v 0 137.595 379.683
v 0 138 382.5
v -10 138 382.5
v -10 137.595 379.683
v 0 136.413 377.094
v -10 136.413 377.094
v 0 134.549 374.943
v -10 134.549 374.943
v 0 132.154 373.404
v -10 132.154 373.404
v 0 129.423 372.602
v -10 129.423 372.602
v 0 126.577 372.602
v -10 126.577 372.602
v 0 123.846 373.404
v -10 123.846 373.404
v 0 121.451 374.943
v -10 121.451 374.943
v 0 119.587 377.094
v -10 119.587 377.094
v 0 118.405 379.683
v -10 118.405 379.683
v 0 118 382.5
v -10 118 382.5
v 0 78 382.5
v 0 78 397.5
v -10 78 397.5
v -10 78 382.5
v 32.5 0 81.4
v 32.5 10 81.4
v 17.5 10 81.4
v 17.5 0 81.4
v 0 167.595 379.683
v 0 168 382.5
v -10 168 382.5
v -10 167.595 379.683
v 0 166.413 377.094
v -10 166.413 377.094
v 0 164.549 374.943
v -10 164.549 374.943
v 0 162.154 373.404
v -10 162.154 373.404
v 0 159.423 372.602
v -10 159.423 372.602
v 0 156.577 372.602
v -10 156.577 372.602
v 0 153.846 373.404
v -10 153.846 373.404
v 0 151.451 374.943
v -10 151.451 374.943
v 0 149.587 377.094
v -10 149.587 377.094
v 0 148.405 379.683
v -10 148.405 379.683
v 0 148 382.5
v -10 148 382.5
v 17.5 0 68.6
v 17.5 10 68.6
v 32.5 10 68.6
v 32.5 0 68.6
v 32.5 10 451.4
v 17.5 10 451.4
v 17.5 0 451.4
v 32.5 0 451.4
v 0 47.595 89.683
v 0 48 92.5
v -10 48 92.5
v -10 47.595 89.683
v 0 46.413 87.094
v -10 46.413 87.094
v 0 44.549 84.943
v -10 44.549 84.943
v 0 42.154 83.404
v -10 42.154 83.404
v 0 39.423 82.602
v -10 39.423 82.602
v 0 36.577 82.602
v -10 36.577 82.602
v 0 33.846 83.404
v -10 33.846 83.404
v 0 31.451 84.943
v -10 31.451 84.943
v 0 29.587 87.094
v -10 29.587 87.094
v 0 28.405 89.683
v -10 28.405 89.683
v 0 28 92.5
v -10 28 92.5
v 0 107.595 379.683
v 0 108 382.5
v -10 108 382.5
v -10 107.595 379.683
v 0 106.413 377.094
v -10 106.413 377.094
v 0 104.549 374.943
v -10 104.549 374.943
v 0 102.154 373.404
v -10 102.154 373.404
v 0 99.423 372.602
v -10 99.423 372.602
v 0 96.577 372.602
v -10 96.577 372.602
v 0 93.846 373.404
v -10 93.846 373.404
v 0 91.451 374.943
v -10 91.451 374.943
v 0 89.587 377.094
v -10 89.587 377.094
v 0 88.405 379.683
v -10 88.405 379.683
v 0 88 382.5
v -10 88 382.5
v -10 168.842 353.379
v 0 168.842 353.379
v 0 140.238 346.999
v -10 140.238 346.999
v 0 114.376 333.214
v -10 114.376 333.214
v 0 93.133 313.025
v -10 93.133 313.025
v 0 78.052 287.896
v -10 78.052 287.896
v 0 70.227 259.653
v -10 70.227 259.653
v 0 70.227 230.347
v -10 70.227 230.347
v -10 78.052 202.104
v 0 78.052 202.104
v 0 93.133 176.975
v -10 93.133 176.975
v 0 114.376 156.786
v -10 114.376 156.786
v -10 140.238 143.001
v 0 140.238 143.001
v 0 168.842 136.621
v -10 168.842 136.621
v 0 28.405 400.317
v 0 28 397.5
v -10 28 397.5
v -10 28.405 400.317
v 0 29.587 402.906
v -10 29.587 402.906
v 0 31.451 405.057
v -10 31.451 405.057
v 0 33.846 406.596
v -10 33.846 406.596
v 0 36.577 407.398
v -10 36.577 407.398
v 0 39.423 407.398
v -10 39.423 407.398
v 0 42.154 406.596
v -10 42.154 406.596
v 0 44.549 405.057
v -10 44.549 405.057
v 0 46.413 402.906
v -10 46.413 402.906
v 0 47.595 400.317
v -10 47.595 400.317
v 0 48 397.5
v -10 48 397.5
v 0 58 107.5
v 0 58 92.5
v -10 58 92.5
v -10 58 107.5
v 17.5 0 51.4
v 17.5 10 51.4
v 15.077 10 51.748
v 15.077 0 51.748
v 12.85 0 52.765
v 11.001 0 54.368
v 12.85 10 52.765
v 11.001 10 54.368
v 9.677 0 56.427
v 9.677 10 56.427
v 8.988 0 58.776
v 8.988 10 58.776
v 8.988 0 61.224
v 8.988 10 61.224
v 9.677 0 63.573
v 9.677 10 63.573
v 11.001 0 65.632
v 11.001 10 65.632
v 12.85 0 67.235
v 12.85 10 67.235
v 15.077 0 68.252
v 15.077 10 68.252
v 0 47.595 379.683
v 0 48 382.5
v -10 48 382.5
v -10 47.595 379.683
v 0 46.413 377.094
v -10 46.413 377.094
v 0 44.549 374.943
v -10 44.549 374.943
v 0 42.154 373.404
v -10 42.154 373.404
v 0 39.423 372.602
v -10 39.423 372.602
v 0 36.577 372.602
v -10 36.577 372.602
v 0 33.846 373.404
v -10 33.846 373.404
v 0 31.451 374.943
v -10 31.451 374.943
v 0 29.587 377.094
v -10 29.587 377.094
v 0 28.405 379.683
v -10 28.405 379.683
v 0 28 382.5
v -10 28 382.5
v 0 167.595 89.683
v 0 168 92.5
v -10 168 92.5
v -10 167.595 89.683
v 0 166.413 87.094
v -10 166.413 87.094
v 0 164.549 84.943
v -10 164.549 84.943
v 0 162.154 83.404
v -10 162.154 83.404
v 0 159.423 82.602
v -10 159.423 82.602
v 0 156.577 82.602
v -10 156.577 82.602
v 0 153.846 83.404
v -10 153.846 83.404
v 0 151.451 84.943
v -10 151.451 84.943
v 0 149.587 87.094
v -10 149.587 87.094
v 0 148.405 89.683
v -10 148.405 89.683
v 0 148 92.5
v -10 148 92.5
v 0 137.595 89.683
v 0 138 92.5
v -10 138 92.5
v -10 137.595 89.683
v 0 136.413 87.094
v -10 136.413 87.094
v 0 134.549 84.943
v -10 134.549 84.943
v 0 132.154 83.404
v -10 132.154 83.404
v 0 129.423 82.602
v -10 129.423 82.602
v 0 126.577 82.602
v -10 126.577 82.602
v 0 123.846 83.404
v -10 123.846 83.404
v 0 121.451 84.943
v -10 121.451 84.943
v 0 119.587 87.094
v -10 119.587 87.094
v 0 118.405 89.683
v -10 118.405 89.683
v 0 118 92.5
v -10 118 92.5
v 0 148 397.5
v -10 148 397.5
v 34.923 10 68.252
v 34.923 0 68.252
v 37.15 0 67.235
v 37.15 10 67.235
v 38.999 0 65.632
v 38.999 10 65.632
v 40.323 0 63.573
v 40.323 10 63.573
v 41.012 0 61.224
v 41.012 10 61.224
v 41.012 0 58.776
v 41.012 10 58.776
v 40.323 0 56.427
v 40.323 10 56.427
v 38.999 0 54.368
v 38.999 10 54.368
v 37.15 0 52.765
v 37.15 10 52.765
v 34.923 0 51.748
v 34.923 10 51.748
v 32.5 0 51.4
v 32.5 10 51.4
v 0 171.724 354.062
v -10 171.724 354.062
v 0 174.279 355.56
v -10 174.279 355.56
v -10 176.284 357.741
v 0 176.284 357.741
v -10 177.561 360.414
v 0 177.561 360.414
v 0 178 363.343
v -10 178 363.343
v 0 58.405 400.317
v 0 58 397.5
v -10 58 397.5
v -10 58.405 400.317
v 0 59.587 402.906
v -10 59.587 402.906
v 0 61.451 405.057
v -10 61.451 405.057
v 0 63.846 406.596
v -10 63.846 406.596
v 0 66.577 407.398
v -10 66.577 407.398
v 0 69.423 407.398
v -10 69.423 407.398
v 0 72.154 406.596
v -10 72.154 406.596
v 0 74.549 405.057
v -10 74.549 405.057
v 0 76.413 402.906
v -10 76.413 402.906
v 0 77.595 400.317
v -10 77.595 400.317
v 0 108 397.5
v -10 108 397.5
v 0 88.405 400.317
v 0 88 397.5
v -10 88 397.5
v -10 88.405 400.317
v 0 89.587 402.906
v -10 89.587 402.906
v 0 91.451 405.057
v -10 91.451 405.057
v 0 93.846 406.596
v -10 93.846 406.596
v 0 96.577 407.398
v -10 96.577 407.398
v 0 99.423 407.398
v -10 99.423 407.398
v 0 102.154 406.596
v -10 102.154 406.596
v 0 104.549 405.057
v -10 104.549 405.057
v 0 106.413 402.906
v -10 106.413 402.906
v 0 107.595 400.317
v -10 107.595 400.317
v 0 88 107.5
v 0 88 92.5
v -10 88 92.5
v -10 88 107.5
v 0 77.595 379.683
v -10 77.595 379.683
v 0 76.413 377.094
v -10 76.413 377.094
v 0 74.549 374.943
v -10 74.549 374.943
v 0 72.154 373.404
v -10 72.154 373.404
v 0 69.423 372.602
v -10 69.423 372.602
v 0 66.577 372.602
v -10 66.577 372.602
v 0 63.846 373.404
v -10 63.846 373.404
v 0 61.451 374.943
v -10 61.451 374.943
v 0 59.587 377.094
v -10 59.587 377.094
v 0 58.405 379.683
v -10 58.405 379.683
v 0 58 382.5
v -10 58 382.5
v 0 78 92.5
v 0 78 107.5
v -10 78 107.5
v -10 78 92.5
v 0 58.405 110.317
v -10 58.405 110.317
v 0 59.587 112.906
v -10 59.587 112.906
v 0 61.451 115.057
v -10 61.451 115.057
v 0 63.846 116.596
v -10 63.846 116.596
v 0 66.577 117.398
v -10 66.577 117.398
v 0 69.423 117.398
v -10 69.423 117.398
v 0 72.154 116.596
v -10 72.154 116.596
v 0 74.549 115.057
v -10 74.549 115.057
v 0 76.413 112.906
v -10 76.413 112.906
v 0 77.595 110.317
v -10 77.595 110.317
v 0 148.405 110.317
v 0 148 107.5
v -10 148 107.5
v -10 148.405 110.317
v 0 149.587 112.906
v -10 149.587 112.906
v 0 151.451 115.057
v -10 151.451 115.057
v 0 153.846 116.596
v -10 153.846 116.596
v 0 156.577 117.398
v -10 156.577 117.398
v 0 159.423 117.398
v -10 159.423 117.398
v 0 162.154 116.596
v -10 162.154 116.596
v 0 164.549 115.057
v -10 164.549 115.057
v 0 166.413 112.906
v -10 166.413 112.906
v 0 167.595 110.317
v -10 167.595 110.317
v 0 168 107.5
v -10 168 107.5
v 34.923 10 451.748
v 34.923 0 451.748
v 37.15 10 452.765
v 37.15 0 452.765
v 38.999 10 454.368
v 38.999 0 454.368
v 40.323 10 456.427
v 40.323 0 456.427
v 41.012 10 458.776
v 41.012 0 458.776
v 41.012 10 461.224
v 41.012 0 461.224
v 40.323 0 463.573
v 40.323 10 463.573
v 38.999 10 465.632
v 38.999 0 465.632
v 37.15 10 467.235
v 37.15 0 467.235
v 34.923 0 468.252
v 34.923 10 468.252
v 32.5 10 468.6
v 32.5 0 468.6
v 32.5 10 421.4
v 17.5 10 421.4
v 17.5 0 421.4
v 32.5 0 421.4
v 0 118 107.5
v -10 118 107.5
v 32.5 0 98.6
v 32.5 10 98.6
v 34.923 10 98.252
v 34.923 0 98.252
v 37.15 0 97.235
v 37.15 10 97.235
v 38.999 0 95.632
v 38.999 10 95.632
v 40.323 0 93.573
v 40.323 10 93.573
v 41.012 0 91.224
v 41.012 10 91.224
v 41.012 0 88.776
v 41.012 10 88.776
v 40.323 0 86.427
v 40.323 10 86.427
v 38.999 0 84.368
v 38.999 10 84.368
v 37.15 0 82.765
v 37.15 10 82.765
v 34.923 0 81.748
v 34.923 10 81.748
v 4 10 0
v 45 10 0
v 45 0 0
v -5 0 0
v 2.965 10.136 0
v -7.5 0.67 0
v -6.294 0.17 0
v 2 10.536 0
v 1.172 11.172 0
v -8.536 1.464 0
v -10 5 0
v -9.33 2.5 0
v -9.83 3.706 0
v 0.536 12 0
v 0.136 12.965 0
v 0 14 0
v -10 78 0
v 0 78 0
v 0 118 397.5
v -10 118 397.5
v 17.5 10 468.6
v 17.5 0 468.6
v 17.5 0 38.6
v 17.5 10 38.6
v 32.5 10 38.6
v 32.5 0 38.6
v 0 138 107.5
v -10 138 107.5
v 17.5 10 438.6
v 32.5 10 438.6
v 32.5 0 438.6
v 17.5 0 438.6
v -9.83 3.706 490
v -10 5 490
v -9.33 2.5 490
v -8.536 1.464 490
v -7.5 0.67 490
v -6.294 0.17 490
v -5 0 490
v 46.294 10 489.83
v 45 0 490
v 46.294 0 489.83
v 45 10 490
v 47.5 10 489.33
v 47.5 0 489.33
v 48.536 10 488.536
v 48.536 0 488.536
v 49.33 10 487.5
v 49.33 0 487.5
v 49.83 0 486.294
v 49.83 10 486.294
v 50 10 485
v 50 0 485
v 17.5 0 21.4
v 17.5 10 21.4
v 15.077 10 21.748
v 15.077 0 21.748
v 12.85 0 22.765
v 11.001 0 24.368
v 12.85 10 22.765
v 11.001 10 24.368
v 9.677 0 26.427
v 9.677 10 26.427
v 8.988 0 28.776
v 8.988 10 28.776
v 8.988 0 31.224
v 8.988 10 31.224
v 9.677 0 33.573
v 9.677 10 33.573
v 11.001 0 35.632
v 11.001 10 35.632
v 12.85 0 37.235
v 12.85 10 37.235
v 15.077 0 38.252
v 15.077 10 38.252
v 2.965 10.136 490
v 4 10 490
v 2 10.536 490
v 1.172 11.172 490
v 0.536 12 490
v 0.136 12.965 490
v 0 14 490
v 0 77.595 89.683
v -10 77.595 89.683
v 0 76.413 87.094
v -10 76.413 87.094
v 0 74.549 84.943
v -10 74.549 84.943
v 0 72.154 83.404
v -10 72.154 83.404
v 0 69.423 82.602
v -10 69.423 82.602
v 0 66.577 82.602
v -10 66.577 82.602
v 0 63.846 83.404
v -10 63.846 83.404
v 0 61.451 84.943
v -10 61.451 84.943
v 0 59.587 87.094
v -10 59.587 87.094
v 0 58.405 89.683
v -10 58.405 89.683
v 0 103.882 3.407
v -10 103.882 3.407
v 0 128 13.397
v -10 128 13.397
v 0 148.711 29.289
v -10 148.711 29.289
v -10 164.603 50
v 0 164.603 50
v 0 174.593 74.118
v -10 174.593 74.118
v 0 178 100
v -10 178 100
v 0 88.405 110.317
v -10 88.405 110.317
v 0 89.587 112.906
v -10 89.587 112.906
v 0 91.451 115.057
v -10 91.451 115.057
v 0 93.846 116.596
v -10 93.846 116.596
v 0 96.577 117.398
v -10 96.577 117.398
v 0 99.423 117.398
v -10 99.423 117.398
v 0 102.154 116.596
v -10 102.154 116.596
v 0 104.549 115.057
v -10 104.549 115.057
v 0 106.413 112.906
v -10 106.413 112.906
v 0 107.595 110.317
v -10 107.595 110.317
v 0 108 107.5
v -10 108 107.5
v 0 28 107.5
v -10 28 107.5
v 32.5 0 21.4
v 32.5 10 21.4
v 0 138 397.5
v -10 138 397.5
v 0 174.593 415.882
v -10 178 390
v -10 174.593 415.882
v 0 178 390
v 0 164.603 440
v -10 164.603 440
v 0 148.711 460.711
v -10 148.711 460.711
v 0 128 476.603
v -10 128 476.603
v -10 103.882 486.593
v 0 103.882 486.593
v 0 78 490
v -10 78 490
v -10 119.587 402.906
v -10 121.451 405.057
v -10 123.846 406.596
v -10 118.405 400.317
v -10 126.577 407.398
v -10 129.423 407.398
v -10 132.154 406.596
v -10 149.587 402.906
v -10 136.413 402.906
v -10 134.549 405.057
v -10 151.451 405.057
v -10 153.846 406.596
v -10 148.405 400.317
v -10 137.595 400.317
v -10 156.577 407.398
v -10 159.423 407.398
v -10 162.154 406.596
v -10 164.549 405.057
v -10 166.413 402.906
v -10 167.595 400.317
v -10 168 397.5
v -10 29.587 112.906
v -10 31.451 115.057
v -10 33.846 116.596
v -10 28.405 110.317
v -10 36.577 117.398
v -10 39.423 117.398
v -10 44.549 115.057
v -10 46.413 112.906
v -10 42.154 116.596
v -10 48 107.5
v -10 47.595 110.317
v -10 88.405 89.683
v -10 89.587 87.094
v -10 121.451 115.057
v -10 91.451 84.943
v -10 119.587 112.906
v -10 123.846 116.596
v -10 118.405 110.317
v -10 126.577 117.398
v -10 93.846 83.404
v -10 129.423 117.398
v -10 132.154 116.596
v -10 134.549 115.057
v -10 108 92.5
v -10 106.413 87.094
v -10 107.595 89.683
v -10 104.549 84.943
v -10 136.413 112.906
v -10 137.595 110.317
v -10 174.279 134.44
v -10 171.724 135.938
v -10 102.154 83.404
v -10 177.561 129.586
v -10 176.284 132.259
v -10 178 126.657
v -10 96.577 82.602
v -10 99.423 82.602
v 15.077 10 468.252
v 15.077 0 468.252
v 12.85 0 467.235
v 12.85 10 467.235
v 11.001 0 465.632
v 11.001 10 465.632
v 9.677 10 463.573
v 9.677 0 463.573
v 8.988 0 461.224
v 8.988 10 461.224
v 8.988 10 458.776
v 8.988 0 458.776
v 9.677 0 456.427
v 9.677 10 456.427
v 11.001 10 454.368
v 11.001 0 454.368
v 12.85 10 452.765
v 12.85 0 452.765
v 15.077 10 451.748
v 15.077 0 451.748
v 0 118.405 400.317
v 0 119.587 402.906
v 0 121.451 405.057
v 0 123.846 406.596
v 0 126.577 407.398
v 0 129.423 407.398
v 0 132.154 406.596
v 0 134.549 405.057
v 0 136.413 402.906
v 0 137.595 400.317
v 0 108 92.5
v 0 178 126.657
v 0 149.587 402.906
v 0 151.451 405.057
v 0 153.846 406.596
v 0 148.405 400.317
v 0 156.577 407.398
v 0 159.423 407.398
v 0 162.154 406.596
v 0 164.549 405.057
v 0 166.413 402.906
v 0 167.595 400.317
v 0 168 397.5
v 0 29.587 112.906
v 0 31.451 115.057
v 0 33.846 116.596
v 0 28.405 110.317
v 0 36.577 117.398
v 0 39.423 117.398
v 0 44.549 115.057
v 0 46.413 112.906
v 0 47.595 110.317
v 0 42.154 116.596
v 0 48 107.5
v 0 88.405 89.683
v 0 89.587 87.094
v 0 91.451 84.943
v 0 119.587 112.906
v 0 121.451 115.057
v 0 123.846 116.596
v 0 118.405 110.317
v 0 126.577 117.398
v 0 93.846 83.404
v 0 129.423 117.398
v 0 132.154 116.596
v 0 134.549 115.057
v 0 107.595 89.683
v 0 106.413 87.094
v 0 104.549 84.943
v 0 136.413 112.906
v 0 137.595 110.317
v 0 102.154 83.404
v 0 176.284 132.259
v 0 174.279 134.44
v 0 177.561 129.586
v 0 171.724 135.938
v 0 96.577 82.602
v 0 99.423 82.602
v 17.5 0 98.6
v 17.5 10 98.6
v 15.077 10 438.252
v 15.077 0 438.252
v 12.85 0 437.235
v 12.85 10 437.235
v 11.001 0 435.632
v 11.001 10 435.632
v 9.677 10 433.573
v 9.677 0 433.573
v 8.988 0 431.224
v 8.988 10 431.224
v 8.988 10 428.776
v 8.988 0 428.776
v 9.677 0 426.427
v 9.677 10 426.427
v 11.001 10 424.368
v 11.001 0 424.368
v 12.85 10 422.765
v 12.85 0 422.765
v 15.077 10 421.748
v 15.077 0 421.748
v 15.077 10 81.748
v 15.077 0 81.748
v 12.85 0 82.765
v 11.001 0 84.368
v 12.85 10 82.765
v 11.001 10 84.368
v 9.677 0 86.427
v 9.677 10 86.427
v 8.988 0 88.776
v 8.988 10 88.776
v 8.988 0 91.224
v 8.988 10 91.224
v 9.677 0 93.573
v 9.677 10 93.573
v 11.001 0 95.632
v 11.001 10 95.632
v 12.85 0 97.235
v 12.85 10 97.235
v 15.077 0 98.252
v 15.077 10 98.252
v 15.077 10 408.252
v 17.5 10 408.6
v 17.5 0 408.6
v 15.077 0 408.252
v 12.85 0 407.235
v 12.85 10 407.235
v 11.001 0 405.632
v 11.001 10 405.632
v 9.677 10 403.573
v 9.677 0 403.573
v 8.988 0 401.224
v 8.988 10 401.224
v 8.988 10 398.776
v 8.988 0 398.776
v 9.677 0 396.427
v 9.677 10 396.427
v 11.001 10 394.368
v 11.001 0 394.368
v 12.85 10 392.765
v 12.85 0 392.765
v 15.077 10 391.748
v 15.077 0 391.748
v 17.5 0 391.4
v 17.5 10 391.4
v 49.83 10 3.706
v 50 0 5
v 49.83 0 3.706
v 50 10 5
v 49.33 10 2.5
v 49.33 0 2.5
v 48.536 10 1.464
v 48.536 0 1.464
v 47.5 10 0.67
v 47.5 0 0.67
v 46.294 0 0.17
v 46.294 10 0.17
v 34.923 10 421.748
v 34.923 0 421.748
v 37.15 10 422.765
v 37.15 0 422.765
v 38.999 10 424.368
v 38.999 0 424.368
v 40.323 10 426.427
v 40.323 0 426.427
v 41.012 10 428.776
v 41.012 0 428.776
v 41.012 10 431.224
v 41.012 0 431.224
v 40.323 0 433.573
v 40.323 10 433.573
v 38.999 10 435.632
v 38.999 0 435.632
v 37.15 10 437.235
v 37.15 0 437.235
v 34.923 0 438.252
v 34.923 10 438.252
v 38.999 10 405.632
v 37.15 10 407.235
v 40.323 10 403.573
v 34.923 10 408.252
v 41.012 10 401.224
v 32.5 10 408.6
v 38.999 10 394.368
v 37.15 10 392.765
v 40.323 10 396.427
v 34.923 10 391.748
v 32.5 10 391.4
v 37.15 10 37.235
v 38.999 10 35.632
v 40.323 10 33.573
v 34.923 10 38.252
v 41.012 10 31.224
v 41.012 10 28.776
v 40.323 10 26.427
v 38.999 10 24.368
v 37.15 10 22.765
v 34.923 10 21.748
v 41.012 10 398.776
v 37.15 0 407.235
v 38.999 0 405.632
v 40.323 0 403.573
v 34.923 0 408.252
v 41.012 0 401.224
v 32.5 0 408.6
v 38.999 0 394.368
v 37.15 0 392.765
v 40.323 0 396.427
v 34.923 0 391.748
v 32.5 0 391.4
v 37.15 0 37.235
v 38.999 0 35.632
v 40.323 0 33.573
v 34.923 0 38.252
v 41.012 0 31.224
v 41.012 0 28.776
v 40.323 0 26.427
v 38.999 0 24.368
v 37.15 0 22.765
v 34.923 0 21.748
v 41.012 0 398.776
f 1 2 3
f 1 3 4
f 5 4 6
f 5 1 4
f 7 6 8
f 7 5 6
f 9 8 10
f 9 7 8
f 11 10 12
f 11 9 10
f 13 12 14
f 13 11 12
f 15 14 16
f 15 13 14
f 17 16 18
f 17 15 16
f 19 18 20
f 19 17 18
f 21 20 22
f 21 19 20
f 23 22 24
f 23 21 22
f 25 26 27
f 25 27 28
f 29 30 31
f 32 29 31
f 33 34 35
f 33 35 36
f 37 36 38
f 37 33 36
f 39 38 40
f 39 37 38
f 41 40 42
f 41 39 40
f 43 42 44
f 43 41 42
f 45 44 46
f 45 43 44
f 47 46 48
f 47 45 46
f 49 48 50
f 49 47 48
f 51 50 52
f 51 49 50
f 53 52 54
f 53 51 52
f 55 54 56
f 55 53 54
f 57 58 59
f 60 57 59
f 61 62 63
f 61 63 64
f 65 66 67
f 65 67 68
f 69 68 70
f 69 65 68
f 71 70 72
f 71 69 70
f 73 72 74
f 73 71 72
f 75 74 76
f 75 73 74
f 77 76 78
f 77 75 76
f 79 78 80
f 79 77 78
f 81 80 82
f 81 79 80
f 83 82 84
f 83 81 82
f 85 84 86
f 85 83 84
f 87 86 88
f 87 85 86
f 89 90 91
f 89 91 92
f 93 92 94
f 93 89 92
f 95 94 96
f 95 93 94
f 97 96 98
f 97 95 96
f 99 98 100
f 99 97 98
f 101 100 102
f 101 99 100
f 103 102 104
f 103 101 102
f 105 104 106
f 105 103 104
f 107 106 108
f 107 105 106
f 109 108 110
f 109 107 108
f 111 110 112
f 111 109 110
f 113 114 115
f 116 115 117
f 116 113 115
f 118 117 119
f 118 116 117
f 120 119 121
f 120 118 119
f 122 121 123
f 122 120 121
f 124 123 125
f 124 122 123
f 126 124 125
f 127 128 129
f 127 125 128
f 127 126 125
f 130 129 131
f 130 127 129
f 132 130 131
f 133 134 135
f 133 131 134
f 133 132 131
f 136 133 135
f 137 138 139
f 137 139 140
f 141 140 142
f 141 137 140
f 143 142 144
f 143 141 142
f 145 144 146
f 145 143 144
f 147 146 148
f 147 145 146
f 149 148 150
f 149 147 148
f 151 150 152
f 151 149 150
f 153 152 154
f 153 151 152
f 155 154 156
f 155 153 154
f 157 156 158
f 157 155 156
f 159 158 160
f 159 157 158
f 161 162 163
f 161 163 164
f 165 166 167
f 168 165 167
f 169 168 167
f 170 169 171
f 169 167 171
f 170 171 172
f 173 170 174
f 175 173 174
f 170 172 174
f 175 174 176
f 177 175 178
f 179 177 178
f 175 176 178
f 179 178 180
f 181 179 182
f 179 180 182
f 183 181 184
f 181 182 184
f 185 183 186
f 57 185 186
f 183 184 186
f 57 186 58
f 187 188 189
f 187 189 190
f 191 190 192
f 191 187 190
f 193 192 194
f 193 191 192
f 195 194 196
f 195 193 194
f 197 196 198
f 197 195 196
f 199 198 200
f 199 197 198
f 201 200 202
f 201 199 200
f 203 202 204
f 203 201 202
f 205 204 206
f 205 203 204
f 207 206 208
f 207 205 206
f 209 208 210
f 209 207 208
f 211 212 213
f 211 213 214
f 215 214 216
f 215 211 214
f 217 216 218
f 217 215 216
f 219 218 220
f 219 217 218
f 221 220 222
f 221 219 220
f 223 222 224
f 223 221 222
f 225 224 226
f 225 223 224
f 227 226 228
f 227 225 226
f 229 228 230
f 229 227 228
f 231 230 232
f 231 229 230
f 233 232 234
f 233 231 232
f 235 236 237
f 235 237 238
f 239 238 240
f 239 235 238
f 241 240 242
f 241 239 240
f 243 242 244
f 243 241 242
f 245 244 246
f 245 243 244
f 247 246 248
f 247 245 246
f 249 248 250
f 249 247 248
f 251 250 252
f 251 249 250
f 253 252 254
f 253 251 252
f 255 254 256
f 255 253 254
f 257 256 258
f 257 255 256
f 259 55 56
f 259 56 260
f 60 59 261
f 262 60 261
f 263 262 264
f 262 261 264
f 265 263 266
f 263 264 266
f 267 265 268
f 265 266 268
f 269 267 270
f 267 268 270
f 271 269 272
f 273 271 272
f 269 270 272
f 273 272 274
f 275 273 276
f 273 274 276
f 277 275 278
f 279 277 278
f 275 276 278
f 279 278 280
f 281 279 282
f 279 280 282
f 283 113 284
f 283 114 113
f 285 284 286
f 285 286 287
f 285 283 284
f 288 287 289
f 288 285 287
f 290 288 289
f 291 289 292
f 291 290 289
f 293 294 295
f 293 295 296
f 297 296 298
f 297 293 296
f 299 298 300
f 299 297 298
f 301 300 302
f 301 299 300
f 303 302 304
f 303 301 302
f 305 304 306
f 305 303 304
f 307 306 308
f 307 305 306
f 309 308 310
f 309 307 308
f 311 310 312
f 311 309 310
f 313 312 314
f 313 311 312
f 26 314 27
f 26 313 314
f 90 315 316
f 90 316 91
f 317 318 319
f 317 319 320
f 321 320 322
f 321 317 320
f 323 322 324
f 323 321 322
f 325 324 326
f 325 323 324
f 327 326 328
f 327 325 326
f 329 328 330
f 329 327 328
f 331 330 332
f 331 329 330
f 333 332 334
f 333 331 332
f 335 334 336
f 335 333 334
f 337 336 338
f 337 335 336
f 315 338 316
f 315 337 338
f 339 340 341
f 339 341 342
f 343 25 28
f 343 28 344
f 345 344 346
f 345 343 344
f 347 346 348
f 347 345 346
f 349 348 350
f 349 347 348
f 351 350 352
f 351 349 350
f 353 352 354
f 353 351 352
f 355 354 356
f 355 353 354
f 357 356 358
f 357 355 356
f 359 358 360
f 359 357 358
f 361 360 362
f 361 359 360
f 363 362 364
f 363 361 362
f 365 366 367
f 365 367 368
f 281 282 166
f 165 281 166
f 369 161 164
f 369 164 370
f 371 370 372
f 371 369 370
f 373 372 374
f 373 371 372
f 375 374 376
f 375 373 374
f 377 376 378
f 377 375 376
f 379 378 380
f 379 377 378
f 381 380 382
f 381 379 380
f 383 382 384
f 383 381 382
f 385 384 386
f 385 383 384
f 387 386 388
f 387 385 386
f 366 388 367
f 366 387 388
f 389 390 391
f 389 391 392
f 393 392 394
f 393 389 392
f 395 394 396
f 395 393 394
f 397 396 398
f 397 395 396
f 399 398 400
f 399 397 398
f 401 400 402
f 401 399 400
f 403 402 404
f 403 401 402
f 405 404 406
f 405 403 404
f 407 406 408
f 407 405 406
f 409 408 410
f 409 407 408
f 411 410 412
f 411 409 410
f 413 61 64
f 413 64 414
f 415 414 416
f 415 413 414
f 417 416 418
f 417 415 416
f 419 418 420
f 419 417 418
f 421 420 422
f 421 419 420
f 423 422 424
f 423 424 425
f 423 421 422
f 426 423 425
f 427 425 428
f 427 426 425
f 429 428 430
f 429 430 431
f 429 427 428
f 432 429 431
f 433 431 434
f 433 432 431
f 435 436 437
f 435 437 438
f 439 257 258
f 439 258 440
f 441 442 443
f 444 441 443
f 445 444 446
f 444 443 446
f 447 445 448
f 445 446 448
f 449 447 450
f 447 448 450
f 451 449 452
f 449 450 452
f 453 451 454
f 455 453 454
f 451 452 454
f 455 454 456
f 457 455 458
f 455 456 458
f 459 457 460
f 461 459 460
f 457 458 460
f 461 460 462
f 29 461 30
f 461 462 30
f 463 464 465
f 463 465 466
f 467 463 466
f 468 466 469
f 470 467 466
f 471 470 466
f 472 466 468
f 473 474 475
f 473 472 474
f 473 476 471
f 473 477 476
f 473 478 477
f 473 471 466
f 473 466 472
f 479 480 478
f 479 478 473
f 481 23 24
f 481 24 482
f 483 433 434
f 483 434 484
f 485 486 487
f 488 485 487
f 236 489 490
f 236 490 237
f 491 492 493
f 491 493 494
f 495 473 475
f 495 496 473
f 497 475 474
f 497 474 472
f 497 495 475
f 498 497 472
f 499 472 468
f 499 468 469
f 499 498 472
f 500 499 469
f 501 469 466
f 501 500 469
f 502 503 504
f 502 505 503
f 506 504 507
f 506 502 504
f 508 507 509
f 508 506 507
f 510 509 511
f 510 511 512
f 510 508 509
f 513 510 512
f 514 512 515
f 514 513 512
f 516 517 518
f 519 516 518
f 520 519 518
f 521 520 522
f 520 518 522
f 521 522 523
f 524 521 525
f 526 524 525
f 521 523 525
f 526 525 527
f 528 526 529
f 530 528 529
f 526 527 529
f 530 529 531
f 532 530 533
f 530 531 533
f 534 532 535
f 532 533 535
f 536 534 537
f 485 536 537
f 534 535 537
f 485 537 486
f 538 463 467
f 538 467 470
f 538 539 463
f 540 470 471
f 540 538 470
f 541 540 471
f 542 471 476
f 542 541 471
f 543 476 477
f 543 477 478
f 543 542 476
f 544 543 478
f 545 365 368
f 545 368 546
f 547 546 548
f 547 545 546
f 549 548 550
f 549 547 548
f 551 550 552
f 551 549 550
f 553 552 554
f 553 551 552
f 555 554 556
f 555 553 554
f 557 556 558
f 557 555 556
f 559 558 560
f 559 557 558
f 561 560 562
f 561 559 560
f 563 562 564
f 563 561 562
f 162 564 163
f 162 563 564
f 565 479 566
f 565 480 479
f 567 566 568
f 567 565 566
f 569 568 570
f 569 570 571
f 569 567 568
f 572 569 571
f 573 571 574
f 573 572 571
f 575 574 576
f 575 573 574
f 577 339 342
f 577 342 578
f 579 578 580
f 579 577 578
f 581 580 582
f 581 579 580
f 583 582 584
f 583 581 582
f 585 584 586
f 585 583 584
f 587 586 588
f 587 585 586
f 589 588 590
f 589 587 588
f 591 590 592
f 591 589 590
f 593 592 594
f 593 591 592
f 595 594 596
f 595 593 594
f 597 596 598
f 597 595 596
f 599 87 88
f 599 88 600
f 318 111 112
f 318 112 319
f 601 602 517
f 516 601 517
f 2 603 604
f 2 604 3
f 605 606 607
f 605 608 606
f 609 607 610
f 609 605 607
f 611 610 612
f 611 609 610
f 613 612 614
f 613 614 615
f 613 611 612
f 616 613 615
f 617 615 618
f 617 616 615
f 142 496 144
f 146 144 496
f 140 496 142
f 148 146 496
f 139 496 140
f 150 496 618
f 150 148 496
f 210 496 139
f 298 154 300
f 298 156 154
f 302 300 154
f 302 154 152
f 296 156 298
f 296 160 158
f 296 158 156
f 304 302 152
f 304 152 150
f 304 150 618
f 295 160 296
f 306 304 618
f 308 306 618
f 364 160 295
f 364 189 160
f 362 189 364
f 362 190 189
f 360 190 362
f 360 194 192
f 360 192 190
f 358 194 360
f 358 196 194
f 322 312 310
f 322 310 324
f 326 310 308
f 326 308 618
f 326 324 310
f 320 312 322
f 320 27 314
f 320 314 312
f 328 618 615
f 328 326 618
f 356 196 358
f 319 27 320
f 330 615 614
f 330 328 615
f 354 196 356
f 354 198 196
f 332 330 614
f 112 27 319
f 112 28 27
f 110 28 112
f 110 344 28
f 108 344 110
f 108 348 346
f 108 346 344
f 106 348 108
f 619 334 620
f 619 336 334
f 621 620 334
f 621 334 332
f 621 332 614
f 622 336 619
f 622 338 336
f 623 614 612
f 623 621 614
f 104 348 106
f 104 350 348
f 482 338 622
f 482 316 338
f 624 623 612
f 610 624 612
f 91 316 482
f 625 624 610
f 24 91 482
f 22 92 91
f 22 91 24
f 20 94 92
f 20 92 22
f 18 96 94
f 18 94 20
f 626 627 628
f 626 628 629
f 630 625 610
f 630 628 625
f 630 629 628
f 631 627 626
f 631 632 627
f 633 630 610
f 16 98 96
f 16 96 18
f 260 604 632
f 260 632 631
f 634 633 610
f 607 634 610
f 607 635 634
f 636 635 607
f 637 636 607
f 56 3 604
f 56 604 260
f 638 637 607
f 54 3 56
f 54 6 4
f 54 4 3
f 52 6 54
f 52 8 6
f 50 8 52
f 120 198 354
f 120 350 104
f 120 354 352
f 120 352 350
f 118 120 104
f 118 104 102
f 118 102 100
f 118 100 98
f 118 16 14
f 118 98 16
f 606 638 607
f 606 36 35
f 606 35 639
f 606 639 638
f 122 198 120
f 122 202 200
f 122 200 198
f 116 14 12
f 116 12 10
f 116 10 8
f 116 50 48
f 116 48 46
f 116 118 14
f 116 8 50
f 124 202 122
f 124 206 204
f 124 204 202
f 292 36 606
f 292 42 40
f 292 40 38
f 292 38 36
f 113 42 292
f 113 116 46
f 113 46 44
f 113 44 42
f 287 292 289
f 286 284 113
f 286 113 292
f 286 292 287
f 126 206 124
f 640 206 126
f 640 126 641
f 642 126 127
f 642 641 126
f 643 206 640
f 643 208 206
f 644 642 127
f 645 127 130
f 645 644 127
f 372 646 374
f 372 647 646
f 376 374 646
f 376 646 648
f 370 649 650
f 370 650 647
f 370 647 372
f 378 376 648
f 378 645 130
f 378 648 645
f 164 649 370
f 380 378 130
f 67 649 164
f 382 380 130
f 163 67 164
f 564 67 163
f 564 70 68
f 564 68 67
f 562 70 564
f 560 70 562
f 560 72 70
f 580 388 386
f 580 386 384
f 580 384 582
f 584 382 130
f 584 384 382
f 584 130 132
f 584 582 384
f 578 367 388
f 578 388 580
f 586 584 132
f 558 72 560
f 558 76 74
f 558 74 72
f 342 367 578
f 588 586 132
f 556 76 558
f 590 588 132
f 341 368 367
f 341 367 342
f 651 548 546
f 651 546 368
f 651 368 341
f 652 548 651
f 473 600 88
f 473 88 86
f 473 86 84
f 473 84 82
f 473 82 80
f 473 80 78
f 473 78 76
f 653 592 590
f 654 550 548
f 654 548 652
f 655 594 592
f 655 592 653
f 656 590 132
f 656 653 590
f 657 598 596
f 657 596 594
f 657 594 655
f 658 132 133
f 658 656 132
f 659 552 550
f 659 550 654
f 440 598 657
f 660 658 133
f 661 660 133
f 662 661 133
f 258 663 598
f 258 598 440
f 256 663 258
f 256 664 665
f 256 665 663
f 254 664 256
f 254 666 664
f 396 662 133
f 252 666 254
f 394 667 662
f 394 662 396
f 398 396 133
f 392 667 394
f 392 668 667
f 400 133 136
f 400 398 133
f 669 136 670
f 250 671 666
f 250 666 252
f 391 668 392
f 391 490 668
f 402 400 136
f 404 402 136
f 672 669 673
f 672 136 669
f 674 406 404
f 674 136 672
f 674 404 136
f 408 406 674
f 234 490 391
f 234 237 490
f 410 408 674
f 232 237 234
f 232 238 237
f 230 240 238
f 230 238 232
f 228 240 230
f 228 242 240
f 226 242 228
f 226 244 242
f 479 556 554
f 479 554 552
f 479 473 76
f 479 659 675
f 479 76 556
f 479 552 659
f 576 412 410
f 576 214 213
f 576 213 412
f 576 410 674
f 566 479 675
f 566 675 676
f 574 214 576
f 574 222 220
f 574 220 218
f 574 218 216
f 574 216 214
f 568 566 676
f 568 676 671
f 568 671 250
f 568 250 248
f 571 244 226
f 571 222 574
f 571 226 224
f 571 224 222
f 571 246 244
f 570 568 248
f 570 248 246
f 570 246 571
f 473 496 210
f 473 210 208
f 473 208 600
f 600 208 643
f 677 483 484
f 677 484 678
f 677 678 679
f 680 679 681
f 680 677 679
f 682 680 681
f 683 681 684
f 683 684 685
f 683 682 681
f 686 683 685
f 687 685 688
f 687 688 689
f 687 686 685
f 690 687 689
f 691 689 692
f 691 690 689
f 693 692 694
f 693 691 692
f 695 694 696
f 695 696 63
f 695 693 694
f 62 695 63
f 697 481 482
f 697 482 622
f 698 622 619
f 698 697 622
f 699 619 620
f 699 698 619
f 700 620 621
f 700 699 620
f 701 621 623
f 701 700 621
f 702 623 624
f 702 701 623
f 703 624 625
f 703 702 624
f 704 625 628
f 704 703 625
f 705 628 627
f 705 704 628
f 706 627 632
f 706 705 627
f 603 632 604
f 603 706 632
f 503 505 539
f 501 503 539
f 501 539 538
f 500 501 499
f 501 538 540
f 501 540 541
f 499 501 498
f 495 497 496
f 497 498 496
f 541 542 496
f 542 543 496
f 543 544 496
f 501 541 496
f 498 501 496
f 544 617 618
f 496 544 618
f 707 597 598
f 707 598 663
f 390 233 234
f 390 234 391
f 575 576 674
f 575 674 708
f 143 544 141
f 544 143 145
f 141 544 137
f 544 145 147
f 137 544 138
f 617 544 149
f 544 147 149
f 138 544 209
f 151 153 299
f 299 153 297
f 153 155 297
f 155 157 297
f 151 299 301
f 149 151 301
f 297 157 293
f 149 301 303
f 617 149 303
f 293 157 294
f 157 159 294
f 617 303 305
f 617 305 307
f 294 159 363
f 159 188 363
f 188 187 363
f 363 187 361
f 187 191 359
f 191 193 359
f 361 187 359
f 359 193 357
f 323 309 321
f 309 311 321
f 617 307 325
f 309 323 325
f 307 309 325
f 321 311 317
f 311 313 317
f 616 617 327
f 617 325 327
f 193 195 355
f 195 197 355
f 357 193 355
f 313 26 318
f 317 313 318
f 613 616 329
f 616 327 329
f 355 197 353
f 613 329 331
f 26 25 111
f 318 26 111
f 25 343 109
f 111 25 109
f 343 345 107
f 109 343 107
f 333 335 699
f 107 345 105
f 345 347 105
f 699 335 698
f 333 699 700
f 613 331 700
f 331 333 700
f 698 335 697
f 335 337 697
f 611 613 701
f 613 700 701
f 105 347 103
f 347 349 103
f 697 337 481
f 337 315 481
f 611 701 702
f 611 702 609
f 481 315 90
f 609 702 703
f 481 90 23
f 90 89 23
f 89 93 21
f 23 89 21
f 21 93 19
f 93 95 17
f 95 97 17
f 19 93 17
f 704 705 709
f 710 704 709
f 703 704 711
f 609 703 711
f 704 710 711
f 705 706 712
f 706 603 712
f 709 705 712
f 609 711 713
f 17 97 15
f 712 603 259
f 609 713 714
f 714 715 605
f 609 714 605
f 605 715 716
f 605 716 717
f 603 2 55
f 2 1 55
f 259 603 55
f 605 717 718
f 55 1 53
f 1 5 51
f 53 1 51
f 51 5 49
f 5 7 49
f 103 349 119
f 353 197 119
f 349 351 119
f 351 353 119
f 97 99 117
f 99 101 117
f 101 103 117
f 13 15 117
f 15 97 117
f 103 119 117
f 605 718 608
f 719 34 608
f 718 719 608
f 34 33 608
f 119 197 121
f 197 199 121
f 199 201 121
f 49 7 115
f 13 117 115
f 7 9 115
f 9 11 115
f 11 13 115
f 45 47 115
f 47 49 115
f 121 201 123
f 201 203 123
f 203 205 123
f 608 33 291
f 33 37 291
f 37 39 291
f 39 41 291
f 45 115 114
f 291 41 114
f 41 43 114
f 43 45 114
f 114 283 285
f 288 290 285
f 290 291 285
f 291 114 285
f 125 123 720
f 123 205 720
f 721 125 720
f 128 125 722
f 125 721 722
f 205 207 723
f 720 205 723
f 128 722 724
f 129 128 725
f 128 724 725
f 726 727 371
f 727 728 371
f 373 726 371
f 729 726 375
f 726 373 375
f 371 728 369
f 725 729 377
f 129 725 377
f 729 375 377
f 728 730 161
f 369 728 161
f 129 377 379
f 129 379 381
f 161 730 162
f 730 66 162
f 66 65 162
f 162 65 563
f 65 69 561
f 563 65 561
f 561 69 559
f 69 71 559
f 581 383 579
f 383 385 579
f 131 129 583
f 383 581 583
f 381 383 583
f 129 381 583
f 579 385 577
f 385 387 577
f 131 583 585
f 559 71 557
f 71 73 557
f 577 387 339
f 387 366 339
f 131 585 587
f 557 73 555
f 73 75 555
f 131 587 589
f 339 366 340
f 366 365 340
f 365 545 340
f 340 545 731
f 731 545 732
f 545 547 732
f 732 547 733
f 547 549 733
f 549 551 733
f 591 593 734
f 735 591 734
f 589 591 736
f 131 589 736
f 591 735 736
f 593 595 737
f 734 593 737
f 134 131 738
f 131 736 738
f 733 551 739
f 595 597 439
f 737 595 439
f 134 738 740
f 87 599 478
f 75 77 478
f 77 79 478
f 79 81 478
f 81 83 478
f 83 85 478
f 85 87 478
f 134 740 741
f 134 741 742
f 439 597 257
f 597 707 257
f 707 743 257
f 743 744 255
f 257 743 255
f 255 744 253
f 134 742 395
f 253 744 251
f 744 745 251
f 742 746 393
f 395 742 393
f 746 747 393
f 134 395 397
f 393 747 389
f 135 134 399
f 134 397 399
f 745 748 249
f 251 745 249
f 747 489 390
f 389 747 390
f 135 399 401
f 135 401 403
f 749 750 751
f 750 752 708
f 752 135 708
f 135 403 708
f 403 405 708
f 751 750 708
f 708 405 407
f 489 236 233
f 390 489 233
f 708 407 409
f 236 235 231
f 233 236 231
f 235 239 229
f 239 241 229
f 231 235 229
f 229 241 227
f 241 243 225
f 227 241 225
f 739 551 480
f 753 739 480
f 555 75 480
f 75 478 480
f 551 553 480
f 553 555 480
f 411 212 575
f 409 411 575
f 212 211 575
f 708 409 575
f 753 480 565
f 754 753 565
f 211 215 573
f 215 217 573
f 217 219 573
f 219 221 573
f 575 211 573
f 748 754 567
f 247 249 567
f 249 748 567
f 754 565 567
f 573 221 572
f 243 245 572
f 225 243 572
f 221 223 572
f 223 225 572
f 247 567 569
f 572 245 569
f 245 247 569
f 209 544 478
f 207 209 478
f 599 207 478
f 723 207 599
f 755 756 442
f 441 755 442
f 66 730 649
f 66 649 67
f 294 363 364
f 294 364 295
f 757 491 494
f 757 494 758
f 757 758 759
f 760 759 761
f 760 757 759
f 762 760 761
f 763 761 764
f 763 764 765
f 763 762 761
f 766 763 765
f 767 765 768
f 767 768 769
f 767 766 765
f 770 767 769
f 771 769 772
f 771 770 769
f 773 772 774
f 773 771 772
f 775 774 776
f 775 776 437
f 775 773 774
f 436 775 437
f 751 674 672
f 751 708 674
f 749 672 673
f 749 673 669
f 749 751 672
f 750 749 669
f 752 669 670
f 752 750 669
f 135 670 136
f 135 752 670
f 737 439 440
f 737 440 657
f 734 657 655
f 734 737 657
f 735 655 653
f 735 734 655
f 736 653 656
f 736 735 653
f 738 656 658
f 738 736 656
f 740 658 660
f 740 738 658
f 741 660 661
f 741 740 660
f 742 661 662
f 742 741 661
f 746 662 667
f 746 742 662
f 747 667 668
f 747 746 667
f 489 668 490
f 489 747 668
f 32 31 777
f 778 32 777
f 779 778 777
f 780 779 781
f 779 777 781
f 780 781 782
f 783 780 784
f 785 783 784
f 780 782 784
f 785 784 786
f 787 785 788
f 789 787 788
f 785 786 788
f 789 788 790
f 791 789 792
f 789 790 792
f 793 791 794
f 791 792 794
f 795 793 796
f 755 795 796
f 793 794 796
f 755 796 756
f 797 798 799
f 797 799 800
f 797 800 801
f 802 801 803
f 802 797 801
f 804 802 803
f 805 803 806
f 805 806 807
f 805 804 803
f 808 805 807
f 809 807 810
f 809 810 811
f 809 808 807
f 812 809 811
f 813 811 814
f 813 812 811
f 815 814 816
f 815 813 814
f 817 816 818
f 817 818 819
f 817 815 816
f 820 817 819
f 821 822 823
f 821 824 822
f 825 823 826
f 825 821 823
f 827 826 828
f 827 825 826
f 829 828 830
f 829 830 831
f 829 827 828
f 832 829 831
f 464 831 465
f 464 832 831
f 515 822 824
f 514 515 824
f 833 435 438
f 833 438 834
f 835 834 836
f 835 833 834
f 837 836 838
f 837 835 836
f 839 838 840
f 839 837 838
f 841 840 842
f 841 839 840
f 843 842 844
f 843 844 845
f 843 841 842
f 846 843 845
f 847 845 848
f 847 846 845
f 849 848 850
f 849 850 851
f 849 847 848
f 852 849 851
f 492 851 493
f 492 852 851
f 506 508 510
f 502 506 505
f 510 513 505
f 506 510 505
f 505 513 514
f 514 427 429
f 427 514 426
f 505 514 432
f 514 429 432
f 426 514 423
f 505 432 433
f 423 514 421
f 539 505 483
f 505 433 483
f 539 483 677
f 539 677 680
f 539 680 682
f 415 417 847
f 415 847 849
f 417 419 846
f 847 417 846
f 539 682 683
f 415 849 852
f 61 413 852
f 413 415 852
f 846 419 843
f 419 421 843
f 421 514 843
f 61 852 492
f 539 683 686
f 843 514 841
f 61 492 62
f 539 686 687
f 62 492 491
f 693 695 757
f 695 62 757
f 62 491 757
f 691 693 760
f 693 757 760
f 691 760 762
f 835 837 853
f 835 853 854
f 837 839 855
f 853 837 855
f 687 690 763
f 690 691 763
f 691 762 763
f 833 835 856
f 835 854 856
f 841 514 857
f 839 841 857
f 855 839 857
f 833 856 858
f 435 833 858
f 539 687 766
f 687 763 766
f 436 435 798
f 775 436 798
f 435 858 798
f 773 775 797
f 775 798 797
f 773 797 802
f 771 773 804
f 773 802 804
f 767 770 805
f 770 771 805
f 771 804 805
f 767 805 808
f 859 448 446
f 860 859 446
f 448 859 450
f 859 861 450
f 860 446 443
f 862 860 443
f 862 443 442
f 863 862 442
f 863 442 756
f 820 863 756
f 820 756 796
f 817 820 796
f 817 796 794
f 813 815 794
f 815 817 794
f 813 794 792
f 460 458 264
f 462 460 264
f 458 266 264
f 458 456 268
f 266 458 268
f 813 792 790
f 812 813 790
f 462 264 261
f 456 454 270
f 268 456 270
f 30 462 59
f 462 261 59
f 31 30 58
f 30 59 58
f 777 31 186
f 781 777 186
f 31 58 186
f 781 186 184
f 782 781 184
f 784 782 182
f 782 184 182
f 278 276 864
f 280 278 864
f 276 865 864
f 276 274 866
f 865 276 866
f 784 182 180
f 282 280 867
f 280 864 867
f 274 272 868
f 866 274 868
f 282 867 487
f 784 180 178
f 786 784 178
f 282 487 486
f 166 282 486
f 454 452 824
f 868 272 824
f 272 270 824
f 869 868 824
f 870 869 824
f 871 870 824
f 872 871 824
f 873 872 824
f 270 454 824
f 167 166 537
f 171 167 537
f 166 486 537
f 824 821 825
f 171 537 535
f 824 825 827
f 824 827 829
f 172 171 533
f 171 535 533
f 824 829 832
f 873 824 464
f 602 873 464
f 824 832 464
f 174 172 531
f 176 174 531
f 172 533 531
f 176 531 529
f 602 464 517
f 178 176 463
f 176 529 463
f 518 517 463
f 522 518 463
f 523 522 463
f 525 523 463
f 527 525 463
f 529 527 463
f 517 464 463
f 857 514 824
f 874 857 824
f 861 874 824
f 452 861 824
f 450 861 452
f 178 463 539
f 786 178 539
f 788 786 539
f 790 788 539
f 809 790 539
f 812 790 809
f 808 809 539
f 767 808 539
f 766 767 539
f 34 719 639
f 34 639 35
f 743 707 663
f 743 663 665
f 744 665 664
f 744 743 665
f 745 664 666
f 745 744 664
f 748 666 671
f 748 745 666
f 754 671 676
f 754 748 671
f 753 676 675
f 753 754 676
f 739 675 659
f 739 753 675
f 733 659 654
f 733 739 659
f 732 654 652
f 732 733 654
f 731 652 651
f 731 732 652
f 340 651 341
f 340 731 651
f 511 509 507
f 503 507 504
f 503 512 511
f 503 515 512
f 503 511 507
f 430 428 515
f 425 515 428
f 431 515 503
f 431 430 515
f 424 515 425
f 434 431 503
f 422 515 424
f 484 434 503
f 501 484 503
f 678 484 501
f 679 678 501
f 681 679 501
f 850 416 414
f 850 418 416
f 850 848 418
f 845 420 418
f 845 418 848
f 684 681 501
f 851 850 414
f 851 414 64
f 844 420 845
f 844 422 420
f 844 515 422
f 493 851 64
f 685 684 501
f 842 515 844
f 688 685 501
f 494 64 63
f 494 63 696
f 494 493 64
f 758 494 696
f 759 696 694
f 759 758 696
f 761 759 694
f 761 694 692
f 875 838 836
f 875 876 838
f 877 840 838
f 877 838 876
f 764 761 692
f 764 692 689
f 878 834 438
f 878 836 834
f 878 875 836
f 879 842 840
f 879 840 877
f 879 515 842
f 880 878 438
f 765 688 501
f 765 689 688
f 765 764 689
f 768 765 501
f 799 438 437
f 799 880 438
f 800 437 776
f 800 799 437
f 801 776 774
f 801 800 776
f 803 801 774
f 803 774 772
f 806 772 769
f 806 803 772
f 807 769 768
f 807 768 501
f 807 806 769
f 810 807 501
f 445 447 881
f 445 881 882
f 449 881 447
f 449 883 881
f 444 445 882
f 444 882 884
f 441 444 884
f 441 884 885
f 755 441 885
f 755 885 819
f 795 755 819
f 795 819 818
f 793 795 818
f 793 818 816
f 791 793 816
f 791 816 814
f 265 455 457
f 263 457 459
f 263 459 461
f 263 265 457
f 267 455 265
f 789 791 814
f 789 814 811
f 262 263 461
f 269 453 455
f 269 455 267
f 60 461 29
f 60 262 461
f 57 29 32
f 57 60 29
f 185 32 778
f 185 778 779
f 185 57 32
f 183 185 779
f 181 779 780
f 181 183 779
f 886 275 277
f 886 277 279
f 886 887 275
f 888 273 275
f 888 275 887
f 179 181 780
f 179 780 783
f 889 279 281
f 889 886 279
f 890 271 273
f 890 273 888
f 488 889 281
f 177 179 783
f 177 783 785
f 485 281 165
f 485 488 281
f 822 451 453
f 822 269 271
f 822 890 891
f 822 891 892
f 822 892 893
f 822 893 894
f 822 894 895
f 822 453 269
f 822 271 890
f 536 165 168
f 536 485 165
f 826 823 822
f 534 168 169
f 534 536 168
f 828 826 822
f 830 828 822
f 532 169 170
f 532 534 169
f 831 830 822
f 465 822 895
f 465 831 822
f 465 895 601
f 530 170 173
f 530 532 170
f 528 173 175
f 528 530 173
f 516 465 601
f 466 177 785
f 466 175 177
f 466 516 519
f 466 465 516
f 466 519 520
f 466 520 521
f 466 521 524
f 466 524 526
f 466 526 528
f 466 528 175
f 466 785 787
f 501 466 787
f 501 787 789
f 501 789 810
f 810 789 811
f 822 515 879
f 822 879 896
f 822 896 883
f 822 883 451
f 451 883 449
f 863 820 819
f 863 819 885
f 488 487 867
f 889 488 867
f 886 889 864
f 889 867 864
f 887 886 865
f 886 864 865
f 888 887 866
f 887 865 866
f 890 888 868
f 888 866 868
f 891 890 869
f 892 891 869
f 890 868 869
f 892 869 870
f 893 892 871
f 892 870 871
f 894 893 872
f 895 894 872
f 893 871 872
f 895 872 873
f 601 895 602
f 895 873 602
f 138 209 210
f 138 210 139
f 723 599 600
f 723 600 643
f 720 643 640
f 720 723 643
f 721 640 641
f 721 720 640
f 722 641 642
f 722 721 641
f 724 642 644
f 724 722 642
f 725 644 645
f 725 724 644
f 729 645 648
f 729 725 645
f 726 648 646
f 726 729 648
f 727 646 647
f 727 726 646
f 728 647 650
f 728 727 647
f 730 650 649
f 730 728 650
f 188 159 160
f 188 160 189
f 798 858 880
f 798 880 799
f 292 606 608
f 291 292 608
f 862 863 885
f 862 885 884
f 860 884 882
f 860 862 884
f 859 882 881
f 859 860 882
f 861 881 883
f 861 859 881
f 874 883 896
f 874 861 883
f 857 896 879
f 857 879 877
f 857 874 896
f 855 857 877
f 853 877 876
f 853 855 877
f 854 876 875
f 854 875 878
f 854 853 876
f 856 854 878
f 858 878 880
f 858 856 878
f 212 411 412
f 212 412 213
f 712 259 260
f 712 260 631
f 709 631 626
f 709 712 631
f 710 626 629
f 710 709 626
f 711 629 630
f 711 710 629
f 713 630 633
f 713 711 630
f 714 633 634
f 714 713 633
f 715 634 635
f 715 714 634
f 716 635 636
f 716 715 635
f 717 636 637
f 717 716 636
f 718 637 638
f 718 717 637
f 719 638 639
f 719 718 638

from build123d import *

# Parameters (mm, degrees)
SZKIC1_W                    = 10
SZKIC1_H                    = 178
DODANIE_WYCI_GNI_CIE1_DEPTH = 490
WYTNIJ_WYCI_GNI_CIE1_DEPTH  = 522.424970633
WYTNIJ_WYCI_GNI_CIE2_DEPTH  = 522.424970633
ZAOKR_GLENIE1_R             = 100
ZAOKR_GLENIE2_R             = 100
WYTNIJ_WYCI_GNI_CIE3_DEPTH  = 522.424970633
ZAOKR_GLENIE3_R             = 10
SZKIC6_W                    = 60
SZKIC6_H                    = 10
DODANIE_WYCI_GNI_CIE2_DEPTH = 490
ZAOKR_GLENIE4_R             = 5
ZAOKR_GLENIE5_R             = 4
ZAOKR_GLENIE6_R             = 5
WYTNIJ_WYCI_GNI_CIE4_DEPTH  = 10
WYTNIJ_WYCI_GNI_CIE5_DEPTH  = 10
WYTNIJ_WYCI_GNI_CIE6_DEPTH  = 10


with BuildPart() as part:
    # Szkic1 → Dodanie-wyciągnięcie1 (new body)
    with BuildSketch(Plane.XY):
        with Locations((-5, 89)):
            Rectangle(SZKIC1_W, SZKIC1_H)
    extrude(amount=DODANIE_WYCI_GNI_CIE1_DEPTH)

    # Szkic2 → Wytnij-wyciągnięcie1 (cut, through all)
    with BuildSketch(Plane(origin=(0, 0, 0), x_dir=(0, 0, -1), z_dir=(1, 0, 0))):
        with BuildLine():
            Line((-107.5, 168), (-92.5, 168))
            ThreePointArc((-92.5, 168), (-82.5, 158), (-92.5, 148))
            Line((-92.5, 148), (-107.5, 148))
            ThreePointArc((-107.5, 148), (-117.5, 158), (-107.5, 168))
        make_face()
        with BuildLine():
            Line((-107.5, 138), (-92.5, 138))
            ThreePointArc((-92.5, 138), (-82.5, 128), (-92.5, 118))
            Line((-92.5, 118), (-107.5, 118))
            ThreePointArc((-107.5, 118), (-117.5, 128), (-107.5, 138))
        make_face()
        with BuildLine():
            Line((-107.5, 108), (-92.5, 108))
            ThreePointArc((-92.5, 108), (-82.5, 98), (-92.5, 88))
            Line((-92.5, 88), (-107.5, 88))
            ThreePointArc((-107.5, 88), (-117.5, 98), (-107.5, 108))
        make_face()
        with BuildLine():
            Line((-107.5, 78), (-92.5, 78))
            ThreePointArc((-92.5, 78), (-82.5, 68), (-92.5, 58))
            Line((-92.5, 58), (-107.5, 58))
            ThreePointArc((-107.5, 58), (-117.5, 68), (-107.5, 78))
        make_face()
        with BuildLine():
            Line((-107.5, 48), (-92.5, 48))
            ThreePointArc((-92.5, 48), (-82.5, 38), (-92.5, 28))
            Line((-92.5, 28), (-107.5, 28))
            ThreePointArc((-107.5, 28), (-117.5, 38), (-107.5, 48))
        make_face()
    extrude(amount=-WYTNIJ_WYCI_GNI_CIE1_DEPTH, mode=Mode.SUBTRACT)

    # Szkic3 → Wytnij-wyciągnięcie2 (cut, through all)
    with BuildSketch(Plane(origin=(0, 0, 0), x_dir=(0, 0, -1), z_dir=(1, 0, 0))):
        with BuildLine():
            Line((-397.5, 168), (-382.5, 168))
            ThreePointArc((-382.5, 168), (-372.5, 158), (-382.5, 148))
            Line((-382.5, 148), (-397.5, 148))
            ThreePointArc((-397.5, 148), (-407.5, 158), (-397.5, 168))
        make_face()
        with BuildLine():
            Line((-397.5, 138), (-382.5, 138))
            ThreePointArc((-382.5, 138), (-372.5, 128), (-382.5, 118))
            Line((-382.5, 118), (-397.5, 118))
            ThreePointArc((-397.5, 118), (-407.5, 128), (-397.5, 138))
        make_face()
        with BuildLine():
            Line((-397.5, 108), (-382.5, 108))
            ThreePointArc((-382.5, 108), (-372.5, 98), (-382.5, 88))
            Line((-382.5, 88), (-397.5, 88))
            ThreePointArc((-397.5, 88), (-407.5, 98), (-397.5, 108))
        make_face()
        with BuildLine():
            Line((-397.5, 78), (-382.5, 78))
            ThreePointArc((-382.5, 78), (-372.5, 68), (-382.5, 58))
            Line((-382.5, 58), (-397.5, 58))
            ThreePointArc((-397.5, 58), (-407.5, 68), (-397.5, 78))
        make_face()
        with BuildLine():
            Line((-397.5, 48), (-382.5, 48))
            ThreePointArc((-382.5, 48), (-372.5, 38), (-382.5, 28))
            Line((-382.5, 28), (-397.5, 28))
            ThreePointArc((-397.5, 28), (-407.5, 38), (-397.5, 48))
        make_face()
    extrude(amount=-WYTNIJ_WYCI_GNI_CIE2_DEPTH, mode=Mode.SUBTRACT)

    # Zaokrąglenie1
    zaokr_glenie1_edges = [part.edges().sort_by_distance(p)[0] for p in [
        (-5, 178, 0),
    ]]
    fillet(zaokr_glenie1_edges, radius=ZAOKR_GLENIE1_R)

    # Zaokrąglenie2
    zaokr_glenie2_edges = [part.edges().sort_by_distance(p)[0] for p in [
        (-5, 178, 490),
    ]]
    fillet(zaokr_glenie2_edges, radius=ZAOKR_GLENIE2_R)

    # Szkic5 → Wytnij-wyciągnięcie3 (cut, through all)
    with BuildSketch(Plane.ZY.offset(10)):
        with BuildLine():
            Line((136.235236097, 178), (353.764763903, 178))
            ThreePointArc((353.764763903, 178), (245, 69.235236097), (136.235236097, 178))
        make_face()
    extrude(amount=-WYTNIJ_WYCI_GNI_CIE3_DEPTH, mode=Mode.SUBTRACT)

    # Zaokrąglenie3
    zaokr_glenie3_edges = [part.edges().sort_by_distance(p)[0] for p in [
        (-5, 178, 353.764763903),
        (-5, 178, 136.235236097),
    ]]
    fillet(zaokr_glenie3_edges, radius=ZAOKR_GLENIE3_R)

    # Szkic6 → Dodanie-wyciągnięcie2 (add, through all)
    with BuildSketch(Plane(origin=(0, 0, 0), x_dir=(-1, 0, 0), z_dir=(0, 0, -1))):
        with Locations((-20, 5)):
            Rectangle(SZKIC6_W, SZKIC6_H)
    extrude(amount=-DODANIE_WYCI_GNI_CIE2_DEPTH)

    # Zaokrąglenie4
    zaokr_glenie4_edges = [part.edges().sort_by_distance(p)[0] for p in [
        (-10, 0, 245),
    ]]
    fillet(zaokr_glenie4_edges, radius=ZAOKR_GLENIE4_R)

    # Zaokrąglenie5
    zaokr_glenie5_edges = [part.edges().sort_by_distance(p)[0] for p in [
        (0, 10, 245),
    ]]
    fillet(zaokr_glenie5_edges, radius=ZAOKR_GLENIE5_R)

    # Zaokrąglenie6
    zaokr_glenie6_edges = [part.edges().sort_by_distance(p)[0] for p in [
        (50, 5, 0),
        (50, 5, 490),
    ]]
    fillet(zaokr_glenie6_edges, radius=ZAOKR_GLENIE6_R)

    # Szkic7 → Wytnij-wyciągnięcie4 (cut)
    with BuildSketch(Plane(origin=(0, 10, 0), x_dir=(1, 0, 0), z_dir=(0, 1, 0))):
        with BuildLine():
            Line((32.5, -468.6), (17.5, -468.6))
            ThreePointArc((17.5, -468.6), (8.9, -460), (17.5, -451.4))
            Line((17.5, -451.4), (32.5, -451.4))
            ThreePointArc((32.5, -451.4), (41.1, -460), (32.5, -468.6))
        make_face()
    wytnij_wyci_gni_cie4 = extrude(amount=-WYTNIJ_WYCI_GNI_CIE4_DEPTH, mode=Mode.SUBTRACT)

    # Lustro2: Wytnij-wyciągnięcie4 across plane
    add(wytnij_wyci_gni_cie4.mirror(Plane(origin=(0, 0, 245), x_dir=(1, 0, 0), z_dir=(0, 0, -1))), mode=Mode.SUBTRACT)

    # Szkic8 → Wytnij-wyciągnięcie5 (cut)
    with BuildSketch(Plane(origin=(0, 10, 0), x_dir=(1, 0, 0), z_dir=(0, 1, 0))):
        with BuildLine():
            Line((17.5, -421.4), (32.5, -421.4))
            ThreePointArc((32.5, -421.4), (41.1, -430), (32.5, -438.6))
            Line((32.5, -438.6), (17.5, -438.6))
            ThreePointArc((17.5, -438.6), (8.9, -430), (17.5, -421.4))
        make_face()
    wytnij_wyci_gni_cie5 = extrude(amount=-WYTNIJ_WYCI_GNI_CIE5_DEPTH, mode=Mode.SUBTRACT)

    # Lustro3: Wytnij-wyciągnięcie5 across plane
    add(wytnij_wyci_gni_cie5.mirror(Plane(origin=(0, 0, 245), x_dir=(1, 0, 0), z_dir=(0, 0, -1))), mode=Mode.SUBTRACT)

    # Szkic9 → Wytnij-wyciągnięcie6 (cut)
    with BuildSketch(Plane(origin=(0, 10, 0), x_dir=(1, 0, 0), z_dir=(0, 1, 0))):
        with BuildLine():
            Line((17.5, -391.4), (32.5, -391.4))
            ThreePointArc((32.5, -391.4), (41.1, -400), (32.5, -408.6))
            Line((32.5, -408.6), (17.5, -408.6))
            ThreePointArc((17.5, -408.6), (8.9, -400), (17.5, -391.4))
        make_face()
    wytnij_wyci_gni_cie6 = extrude(amount=-WYTNIJ_WYCI_GNI_CIE6_DEPTH, mode=Mode.SUBTRACT)

    # Lustro4: Wytnij-wyciągnięcie6 across plane
    add(wytnij_wyci_gni_cie6.mirror(Plane(origin=(0, 0, 245), x_dir=(1, 0, 0), z_dir=(0, 0, -1))), mode=Mode.SUBTRACT)


solid = part.part
